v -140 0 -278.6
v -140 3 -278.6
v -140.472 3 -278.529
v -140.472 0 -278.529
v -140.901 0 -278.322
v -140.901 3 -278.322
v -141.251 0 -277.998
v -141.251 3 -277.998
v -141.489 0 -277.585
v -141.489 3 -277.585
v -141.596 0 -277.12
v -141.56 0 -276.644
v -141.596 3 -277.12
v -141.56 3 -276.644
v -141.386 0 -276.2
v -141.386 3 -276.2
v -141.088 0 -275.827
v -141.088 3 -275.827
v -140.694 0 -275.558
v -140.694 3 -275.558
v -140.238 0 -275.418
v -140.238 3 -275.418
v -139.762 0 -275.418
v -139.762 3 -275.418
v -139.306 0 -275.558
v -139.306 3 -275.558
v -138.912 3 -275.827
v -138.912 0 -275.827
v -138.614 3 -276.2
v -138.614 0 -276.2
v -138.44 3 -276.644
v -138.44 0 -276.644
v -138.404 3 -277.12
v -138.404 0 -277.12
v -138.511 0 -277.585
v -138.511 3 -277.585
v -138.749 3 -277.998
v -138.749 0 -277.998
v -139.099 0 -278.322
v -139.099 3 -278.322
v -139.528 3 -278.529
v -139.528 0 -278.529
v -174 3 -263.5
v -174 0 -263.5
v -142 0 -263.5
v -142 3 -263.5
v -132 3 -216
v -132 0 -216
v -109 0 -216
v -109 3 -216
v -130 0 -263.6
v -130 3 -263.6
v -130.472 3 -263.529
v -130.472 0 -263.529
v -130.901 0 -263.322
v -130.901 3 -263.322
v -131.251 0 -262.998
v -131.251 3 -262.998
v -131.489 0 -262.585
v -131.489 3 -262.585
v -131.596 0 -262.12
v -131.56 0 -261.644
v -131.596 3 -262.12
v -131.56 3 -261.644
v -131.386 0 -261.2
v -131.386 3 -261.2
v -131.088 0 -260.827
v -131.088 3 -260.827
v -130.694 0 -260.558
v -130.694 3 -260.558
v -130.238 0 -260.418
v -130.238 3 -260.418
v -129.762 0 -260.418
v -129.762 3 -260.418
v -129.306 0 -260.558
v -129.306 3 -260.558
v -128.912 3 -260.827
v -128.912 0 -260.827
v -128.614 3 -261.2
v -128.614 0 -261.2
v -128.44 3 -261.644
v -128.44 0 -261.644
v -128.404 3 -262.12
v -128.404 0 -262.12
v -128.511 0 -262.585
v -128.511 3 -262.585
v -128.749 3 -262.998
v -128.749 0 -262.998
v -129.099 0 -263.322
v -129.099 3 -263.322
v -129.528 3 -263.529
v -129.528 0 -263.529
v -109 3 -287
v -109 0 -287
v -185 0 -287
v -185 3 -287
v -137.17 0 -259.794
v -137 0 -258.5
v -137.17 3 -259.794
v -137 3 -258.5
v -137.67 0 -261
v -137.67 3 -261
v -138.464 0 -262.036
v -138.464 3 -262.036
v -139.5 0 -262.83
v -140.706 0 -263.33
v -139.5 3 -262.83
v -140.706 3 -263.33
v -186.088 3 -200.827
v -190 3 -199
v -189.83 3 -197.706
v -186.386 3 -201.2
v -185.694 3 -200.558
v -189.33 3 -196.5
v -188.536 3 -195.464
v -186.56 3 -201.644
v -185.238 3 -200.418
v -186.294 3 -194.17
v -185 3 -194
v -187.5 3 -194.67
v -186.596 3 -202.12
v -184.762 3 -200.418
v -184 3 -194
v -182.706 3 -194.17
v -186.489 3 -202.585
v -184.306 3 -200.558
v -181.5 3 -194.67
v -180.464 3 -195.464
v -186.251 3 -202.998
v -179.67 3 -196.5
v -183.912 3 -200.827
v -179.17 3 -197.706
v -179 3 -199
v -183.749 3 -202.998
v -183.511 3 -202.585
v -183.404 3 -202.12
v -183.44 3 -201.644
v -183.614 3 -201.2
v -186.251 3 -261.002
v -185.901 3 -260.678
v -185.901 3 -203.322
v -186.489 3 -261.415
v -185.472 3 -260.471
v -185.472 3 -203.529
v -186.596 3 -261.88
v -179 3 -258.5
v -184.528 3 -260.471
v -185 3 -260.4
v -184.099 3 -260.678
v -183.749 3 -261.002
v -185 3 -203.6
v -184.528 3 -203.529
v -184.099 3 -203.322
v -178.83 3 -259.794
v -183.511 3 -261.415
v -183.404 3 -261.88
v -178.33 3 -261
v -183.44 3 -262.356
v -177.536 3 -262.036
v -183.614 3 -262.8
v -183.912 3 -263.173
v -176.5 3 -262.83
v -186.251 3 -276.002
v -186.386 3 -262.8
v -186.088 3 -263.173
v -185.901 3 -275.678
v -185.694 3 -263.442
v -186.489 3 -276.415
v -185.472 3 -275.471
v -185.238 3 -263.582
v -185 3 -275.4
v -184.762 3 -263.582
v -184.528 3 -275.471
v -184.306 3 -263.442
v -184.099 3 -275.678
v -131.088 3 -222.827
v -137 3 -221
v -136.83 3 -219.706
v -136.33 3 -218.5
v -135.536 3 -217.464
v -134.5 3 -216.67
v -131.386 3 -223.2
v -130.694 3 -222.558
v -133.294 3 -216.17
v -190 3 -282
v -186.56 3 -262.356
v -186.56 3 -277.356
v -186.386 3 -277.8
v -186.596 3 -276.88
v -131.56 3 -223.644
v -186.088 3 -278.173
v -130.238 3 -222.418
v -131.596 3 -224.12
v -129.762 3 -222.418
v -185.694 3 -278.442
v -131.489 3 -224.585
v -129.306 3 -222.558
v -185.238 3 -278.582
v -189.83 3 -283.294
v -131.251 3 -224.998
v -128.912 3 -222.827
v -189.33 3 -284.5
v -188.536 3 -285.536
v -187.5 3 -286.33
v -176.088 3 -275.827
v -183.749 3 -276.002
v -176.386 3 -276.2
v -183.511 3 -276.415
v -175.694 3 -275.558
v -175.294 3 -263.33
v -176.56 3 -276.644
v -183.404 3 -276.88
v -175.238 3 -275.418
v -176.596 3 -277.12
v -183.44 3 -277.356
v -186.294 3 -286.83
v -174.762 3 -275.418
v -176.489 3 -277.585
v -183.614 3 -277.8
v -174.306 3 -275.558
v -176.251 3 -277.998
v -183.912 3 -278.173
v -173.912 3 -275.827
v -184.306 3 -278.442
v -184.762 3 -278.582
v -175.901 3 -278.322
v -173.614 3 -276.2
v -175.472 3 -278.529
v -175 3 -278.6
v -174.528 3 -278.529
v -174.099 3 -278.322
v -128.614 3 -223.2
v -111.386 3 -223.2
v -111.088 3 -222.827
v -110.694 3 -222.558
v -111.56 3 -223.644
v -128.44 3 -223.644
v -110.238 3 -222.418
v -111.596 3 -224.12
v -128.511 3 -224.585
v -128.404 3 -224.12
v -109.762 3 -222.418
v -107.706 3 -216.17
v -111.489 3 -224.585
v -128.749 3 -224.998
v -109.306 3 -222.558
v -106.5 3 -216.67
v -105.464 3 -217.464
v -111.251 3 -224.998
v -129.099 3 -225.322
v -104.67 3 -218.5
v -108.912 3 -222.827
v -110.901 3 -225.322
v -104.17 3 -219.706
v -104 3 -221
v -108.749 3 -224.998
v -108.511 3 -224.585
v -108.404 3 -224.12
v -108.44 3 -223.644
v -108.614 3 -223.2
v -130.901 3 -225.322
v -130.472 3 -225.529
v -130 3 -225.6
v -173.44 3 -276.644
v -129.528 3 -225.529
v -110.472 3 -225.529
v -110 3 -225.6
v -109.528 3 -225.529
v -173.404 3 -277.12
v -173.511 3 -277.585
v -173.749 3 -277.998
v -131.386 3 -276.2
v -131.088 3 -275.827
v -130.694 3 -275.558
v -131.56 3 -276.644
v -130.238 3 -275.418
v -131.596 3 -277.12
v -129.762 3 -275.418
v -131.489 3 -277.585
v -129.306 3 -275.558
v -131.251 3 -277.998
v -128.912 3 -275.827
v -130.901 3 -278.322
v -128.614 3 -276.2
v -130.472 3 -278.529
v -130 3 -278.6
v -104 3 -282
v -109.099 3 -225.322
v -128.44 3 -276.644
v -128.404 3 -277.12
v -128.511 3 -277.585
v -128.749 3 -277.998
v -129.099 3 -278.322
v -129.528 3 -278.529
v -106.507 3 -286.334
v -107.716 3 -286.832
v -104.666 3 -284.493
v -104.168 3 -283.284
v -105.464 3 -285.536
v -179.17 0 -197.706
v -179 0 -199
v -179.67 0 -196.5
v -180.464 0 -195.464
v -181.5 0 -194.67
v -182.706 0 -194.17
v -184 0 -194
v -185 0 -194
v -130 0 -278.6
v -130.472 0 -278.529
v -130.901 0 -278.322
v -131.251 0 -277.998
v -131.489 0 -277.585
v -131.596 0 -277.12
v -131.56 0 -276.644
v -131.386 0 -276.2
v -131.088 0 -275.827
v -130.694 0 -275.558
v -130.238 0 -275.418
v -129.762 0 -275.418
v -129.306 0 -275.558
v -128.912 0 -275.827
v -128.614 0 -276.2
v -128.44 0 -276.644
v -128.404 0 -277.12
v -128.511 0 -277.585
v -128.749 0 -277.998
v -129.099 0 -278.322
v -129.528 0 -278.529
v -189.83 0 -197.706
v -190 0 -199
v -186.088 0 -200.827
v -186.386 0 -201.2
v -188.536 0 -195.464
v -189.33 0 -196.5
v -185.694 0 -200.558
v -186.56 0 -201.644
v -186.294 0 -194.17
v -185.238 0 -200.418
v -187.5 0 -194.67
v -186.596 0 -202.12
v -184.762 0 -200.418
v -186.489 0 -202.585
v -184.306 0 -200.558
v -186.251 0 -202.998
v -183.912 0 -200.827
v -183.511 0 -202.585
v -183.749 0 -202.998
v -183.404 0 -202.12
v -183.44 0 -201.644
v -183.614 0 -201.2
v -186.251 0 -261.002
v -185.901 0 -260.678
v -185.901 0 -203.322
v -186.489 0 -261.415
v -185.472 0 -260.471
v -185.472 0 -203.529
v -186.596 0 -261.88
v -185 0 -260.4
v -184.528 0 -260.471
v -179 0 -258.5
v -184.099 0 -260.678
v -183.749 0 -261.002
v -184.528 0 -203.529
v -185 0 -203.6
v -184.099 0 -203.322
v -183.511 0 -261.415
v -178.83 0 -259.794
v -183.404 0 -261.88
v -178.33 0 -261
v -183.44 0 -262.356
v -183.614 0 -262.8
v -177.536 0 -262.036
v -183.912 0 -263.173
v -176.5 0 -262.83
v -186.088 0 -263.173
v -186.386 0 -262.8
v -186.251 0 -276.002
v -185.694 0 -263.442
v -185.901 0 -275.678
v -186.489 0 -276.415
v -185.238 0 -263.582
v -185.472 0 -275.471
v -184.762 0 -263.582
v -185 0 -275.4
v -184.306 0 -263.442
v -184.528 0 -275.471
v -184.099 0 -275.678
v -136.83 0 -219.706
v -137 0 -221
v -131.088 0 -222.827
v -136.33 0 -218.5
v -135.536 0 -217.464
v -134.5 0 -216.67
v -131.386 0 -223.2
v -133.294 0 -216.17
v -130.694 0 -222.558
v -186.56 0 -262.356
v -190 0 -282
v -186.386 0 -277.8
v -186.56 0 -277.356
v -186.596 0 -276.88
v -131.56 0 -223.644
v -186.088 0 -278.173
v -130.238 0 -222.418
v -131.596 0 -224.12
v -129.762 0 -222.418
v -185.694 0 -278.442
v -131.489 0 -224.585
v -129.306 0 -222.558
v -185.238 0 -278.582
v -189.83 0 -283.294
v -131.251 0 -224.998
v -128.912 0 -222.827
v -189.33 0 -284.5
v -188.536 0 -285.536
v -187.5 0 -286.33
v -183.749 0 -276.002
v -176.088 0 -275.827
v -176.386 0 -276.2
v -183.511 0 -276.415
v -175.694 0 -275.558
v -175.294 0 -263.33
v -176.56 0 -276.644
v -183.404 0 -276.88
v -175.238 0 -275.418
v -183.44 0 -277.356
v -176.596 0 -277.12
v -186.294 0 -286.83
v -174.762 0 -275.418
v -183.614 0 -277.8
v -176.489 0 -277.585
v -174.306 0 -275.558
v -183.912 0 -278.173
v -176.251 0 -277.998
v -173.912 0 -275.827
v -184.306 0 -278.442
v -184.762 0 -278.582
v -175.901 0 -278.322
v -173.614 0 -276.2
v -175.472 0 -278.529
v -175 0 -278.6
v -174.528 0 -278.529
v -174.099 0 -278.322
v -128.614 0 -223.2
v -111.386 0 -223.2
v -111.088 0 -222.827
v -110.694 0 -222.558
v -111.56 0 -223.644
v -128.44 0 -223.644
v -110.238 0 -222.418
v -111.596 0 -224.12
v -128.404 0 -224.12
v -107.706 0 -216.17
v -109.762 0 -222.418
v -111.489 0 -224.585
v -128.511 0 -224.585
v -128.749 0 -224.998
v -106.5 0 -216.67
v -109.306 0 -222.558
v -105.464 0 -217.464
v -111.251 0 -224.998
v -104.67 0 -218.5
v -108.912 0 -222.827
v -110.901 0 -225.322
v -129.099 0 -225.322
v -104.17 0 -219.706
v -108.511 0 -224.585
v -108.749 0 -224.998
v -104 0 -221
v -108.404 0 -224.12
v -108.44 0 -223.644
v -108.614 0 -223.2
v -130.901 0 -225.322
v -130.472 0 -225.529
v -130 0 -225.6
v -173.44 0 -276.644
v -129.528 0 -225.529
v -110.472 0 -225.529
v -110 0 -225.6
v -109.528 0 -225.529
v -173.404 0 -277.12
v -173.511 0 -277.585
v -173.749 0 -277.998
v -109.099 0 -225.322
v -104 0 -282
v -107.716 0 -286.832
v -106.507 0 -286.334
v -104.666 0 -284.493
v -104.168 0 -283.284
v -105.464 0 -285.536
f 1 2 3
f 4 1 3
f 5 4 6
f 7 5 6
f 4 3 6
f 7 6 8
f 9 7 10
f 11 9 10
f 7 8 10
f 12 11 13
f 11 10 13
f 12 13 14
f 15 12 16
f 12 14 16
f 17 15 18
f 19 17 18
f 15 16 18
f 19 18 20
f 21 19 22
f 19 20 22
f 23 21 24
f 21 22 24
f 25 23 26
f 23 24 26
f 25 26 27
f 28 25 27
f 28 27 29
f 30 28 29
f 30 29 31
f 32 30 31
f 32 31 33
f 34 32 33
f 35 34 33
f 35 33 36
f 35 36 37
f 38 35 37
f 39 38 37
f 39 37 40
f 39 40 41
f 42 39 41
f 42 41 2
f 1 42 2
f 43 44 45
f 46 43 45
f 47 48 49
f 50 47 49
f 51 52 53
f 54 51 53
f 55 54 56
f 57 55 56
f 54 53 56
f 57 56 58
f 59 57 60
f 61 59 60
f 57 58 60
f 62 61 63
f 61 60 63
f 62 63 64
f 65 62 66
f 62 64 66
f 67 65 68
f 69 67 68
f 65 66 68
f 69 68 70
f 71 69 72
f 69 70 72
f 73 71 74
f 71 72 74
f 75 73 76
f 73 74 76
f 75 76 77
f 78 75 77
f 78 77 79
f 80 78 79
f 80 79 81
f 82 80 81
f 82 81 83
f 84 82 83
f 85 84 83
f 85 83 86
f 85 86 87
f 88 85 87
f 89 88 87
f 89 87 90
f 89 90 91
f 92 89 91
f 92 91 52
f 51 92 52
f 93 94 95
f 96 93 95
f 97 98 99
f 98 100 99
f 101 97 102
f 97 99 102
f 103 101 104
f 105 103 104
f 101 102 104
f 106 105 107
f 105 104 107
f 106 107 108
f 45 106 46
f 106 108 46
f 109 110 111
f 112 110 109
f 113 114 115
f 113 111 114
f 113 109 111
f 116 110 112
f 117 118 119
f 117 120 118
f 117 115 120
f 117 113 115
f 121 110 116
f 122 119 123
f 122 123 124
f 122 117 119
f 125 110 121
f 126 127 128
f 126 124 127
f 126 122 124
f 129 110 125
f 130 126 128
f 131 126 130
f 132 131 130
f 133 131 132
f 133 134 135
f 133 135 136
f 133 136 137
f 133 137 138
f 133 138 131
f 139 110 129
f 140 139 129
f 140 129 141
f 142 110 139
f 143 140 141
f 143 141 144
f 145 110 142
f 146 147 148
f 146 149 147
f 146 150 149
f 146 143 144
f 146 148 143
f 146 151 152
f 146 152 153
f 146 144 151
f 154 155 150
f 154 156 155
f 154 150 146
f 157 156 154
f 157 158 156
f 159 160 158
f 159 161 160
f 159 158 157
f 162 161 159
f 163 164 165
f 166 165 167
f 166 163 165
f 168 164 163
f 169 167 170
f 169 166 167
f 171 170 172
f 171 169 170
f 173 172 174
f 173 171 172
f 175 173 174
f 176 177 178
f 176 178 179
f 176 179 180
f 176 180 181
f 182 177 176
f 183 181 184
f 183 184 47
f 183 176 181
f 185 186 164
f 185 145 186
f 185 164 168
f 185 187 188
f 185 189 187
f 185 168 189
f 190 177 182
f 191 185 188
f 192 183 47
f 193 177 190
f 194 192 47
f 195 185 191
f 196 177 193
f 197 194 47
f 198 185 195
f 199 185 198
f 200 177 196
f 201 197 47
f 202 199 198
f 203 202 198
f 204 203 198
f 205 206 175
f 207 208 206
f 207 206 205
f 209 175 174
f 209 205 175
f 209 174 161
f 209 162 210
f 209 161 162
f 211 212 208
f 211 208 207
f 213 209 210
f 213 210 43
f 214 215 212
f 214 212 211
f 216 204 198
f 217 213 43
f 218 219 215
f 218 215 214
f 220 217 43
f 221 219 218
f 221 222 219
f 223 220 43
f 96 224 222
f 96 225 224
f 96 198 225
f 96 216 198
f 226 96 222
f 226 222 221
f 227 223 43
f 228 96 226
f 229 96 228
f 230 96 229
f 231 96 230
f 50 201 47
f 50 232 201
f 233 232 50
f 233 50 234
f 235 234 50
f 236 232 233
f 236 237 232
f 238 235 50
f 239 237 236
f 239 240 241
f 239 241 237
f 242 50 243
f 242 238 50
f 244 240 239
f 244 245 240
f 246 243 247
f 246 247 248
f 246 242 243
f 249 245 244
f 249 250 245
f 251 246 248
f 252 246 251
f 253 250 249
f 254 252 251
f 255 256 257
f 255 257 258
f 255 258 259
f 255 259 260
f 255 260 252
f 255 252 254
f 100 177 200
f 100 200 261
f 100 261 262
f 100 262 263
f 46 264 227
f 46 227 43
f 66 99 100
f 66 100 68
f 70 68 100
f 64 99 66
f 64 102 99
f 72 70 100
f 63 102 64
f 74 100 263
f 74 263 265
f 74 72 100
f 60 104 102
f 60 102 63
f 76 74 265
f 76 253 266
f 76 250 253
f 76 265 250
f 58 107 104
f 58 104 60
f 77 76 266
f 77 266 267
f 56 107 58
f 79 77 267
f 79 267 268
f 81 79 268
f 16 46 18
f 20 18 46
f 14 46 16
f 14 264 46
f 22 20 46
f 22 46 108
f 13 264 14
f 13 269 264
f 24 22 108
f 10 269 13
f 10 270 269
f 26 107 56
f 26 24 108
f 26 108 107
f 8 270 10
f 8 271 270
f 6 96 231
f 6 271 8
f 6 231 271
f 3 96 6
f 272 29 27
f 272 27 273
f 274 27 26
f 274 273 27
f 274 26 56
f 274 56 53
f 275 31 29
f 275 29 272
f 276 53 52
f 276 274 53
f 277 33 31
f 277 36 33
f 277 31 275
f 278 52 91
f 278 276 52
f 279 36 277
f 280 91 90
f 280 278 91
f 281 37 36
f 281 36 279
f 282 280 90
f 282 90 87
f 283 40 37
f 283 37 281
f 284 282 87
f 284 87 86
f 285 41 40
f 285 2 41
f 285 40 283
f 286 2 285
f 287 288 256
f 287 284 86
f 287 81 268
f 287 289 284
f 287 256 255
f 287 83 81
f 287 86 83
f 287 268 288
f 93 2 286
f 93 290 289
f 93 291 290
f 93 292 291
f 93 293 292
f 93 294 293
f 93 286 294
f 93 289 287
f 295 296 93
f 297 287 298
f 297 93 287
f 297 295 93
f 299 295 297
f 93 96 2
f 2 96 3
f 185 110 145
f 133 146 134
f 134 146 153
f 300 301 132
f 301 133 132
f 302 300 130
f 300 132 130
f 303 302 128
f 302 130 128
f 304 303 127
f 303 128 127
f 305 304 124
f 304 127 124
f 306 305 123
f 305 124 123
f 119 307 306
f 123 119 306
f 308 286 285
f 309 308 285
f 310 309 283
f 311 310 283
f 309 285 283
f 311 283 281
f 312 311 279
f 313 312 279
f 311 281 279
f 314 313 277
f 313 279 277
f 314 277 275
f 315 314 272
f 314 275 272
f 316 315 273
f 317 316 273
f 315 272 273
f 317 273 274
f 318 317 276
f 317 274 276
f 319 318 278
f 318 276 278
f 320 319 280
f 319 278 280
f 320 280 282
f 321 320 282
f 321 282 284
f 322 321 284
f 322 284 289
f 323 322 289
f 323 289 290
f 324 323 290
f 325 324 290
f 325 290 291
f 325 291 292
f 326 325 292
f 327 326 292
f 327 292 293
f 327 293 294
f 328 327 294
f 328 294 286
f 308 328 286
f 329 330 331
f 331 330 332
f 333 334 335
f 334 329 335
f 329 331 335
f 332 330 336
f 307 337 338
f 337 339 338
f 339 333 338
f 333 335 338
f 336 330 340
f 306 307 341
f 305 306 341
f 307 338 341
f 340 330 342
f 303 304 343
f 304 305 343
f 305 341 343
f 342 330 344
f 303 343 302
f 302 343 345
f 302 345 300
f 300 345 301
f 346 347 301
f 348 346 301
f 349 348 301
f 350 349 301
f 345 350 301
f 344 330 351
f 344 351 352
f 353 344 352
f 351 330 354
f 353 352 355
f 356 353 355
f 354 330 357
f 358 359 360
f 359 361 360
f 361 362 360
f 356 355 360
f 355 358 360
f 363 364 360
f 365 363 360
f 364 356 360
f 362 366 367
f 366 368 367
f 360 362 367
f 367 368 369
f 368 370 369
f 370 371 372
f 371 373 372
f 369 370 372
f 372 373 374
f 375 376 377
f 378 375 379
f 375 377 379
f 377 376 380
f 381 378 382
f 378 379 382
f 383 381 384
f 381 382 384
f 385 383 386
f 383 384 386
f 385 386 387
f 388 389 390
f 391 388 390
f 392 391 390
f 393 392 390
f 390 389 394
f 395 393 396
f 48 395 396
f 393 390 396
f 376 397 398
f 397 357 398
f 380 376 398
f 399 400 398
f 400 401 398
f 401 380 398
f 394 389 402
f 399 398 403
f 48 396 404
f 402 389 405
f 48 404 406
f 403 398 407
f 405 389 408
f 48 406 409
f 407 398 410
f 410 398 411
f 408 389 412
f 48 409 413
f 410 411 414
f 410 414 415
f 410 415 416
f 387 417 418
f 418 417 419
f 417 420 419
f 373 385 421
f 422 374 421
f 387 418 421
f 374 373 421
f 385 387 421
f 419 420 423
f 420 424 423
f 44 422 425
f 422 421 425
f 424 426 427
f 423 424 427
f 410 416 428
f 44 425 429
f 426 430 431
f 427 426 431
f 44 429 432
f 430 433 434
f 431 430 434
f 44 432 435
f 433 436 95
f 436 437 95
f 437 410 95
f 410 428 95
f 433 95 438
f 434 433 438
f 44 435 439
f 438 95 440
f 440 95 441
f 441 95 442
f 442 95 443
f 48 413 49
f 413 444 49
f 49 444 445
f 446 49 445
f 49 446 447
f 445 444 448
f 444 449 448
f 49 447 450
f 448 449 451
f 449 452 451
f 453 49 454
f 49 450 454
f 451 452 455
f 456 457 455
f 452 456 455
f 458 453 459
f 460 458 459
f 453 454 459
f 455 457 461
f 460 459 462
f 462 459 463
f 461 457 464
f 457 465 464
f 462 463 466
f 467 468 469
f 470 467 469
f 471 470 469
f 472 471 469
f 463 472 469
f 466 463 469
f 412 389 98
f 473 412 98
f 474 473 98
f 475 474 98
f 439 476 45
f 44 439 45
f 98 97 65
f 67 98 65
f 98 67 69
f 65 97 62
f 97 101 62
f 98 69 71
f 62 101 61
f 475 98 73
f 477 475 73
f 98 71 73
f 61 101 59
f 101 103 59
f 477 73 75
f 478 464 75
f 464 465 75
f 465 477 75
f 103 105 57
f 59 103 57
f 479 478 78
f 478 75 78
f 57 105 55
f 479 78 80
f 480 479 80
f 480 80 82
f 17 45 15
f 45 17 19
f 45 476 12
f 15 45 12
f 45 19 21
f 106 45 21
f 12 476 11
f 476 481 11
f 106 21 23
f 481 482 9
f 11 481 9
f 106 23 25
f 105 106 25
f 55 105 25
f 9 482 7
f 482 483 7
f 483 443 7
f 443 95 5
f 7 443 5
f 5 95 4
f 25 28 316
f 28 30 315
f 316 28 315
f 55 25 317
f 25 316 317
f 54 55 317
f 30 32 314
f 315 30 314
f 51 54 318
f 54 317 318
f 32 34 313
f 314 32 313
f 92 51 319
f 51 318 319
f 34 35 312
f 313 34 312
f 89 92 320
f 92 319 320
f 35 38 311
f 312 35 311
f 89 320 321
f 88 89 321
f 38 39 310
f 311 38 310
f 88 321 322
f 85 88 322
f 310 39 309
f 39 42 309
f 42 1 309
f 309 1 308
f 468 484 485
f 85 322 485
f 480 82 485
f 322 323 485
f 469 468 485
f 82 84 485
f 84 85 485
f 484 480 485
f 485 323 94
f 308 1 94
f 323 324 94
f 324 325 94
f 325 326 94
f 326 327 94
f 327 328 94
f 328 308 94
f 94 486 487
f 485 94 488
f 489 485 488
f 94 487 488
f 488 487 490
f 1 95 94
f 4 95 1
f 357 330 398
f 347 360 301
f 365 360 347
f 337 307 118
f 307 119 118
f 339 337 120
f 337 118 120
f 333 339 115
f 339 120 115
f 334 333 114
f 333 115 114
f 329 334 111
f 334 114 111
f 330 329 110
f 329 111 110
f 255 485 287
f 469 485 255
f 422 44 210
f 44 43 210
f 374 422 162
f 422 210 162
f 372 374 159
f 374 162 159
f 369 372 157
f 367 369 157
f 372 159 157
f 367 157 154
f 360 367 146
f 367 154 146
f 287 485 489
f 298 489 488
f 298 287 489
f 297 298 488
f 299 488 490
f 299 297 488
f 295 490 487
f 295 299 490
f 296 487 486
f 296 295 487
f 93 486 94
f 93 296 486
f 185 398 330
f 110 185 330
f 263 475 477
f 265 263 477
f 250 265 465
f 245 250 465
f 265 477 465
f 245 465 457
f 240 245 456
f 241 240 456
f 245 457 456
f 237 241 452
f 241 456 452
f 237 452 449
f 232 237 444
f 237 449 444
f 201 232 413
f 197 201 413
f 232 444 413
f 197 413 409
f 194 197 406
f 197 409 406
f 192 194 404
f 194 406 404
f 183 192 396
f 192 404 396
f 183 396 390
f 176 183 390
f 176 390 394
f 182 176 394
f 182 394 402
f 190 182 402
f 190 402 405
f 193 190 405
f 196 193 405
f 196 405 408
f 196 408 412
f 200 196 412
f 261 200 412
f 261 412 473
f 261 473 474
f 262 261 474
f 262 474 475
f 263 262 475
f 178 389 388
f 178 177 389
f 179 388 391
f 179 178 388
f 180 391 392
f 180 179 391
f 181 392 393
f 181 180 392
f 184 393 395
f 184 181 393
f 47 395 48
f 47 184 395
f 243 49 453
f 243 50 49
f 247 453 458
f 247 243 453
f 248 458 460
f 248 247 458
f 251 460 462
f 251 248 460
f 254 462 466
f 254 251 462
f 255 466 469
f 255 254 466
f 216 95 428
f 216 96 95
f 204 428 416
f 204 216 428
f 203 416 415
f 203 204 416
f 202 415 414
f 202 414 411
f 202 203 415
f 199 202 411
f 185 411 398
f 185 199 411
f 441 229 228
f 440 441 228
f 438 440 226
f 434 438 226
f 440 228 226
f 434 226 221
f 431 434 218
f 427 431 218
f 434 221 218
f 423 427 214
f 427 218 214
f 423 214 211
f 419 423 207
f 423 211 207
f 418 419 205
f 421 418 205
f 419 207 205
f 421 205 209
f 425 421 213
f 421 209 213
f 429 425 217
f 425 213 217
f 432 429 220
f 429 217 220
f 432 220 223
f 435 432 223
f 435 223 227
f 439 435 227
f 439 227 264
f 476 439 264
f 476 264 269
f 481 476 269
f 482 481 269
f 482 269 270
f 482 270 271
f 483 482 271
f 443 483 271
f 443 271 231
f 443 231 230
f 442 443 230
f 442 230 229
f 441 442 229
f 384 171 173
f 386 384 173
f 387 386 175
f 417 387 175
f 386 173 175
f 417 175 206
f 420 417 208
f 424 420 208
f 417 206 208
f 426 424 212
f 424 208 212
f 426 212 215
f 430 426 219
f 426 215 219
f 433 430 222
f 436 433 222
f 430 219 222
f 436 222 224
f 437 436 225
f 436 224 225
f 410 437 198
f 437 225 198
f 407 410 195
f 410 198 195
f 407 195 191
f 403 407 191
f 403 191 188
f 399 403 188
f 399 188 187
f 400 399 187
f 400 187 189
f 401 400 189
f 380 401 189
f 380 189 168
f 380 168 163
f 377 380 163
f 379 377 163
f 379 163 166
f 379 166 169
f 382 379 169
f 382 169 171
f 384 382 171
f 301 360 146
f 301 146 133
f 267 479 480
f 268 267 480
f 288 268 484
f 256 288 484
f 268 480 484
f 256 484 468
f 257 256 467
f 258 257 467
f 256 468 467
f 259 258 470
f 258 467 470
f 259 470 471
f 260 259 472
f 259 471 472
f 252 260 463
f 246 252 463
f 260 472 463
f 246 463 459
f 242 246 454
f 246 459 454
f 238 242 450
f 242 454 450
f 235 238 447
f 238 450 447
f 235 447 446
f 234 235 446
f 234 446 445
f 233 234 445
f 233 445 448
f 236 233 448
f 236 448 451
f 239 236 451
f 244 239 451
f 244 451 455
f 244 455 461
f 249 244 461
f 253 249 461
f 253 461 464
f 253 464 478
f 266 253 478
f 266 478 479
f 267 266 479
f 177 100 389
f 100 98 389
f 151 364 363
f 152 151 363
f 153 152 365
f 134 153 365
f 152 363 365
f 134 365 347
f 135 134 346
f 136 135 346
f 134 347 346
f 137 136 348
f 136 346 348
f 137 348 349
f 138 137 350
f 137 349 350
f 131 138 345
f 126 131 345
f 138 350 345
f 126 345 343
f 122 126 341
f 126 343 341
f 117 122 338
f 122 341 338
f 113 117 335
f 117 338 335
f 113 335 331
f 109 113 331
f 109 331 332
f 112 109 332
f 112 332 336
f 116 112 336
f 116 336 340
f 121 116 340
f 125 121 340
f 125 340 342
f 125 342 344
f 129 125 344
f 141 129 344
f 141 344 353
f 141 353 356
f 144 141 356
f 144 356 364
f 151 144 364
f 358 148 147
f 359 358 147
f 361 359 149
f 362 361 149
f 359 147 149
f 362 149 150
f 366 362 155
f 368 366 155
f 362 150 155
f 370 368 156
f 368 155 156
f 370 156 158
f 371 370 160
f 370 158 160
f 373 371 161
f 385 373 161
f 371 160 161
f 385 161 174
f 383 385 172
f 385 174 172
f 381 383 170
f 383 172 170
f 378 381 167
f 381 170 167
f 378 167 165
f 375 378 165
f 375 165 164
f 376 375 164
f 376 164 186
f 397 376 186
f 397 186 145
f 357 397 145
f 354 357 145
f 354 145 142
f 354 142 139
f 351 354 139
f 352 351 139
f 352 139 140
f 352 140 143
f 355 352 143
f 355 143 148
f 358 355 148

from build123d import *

# Parameters (mm, degrees)
EXTRUDE_1048_DEPTH      = 3
SKETCH_2_R              = 37.5
SKETCH_2_R_2            = 1.6
CUT_EXTRUDE_1713_DEPTH  = 3
SKETCH_8_W              = 65
SKETCH_8_H              = 25
CUT_EXTRUDE_2585_DEPTH  = 3
SKETCH_41_W             = 55
SKETCH_41_H             = 60
CUT_EXTRUDE_2_DEPTH     = 10
SKETCH_10_W             = 65
SKETCH_10_H             = 30
CUT_EXTRUDE_3791_DEPTH  = 3
SKETCH_11_R             = 1.6
SKETCH_11_W             = 42
SKETCH_11_H             = 28
CUT_EXTRUDE_4900_DEPTH  = 3
SKETCH_13_R             = 1.6
CUT_EXTRUDE_5556_DEPTH  = 3
SKETCH_14_R             = 2
CUT_EXTRUDE_5906_DEPTH  = 3
SKETCH_15_R             = 2
CUT_EXTRUDE_6166_DEPTH  = 3
SKETCH_16_R             = 1.6
CUT_EXTRUDE_6673_DEPTH  = 3
SKETCH_19_R             = 2
SKETCH_19_R_2           = 2.5
CUT_EXTRUDE_7839_DEPTH  = 3
SKETCH_21_R             = 1.6
CUT_EXTRUDE_7991_DEPTH  = 3
CUT_EXTRUDE_9_DEPTH     = 10
SKETCH_33_R             = 1.6
PC_DEPTH                = 10
SKETCH_36_R             = 1.6
CUT_EXTRUDE_9334_DEPTH  = 345.206333469
SKETCH_29_R             = 1.6
CUT_EXTRUDE_9716_DEPTH  = 10
SKETCH_39_R             = 1.6
CUT_EXTRUDE_10318_DEPTH = 10
SKETCH_42_W             = 40
SKETCH_42_H             = 40
CUT_EXTRUDE_11_DEPTH    = 10
SKETCH_34_R             = 1.6
UWB_DEPTH               = 10
SKETCH_47_R             = 1.6
CUT_EXTRUDE_13151_DEPTH = 345.206333469
SKETCH_48_R             = 1.6
CUT_EXTRUDE_14_DEPTH    = 345.206333469
CUT_EXTRUDE_6623_DEPTH  = 10
FILLET_13946_R          = 5
FILLET_14545_R          = 2
SKETCH_53_R             = 1.6
RFID_DEPTH              = 10
SKETCH_54_R             = 1.6
CUT_EXTRUDE_19166_DEPTH = 10
SKETCH_55_OUTSIDE_W     = 518.68
SKETCH_55_OUTSIDE_H     = 706.68
CUT_EXTRUDE_17_DEPTH    = 10
FILLET_1_R              = 5
SKETCH_56_R             = 1.6
CUT_EXTRUDE_18_DEPTH    = 10
SKETCH_57_W             = 16
SKETCH_57_H             = 59
CUT_EXTRUDE_19_DEPTH    = 10
SKETCH_58_R             = 1.55
CUT_EXTRUDE_20_DEPTH    = 10
FILLET_2_R              = 2
SKETCH_59_W             = 42
SKETCH_59_H             = 69.5
CUT_EXTRUDE_21_DEPTH    = 10
SKETCH_61_W             = 31.526817686
SKETCH_61_H             = 93
CUT_EXTRUDE_23_DEPTH    = 10
SKETCH_62_W             = 33
SKETCH_62_H             = 22
CUT_EXTRUDE_24_DEPTH    = 10
FILLET_3_R              = 5
SKETCH_63_R             = 1.6
CUT_EXTRUDE_25_DEPTH    = 10


with BuildPart() as part:
    # 草图1 → Extrude 1048 (new body)
    with BuildSketch(Plane(origin=(0, 0, 0), x_dir=(1, 0, 0), z_dir=(0, 1, 0))):
        Polygon((190, 287), (101.545, 287), (79.605689771, 249), (-79.605689771, 249), (-101.545, 287), (-190, 287), (-190, 0), (-190, -281), (-144.091695942, -281), (-98.660254038, -281), (-74.411542732, -239), (74.411542732, -239), (98.660254038, -281), (144.091695942, -281), (190, -281), (190, 0), align=None)
    extrude(amount=EXTRUDE_1048_DEPTH)

    # 草图2 → Cut-Extrude 1713 (cut)
    with BuildSketch(Plane(origin=(0, 3, 0), x_dir=(1, 0, 0), z_dir=(0, 1, 0))):
        Circle(SKETCH_2_R)
        with Locations((38.97114317, 22.5)):
            Circle(SKETCH_2_R_2)
        with Locations((0, -45)):
            Circle(SKETCH_2_R_2)
        with Locations((-38.97114317, 22.5)):
            Circle(SKETCH_2_R_2)
    extrude(amount=-CUT_EXTRUDE_1713_DEPTH, mode=Mode.SUBTRACT)

    # 草图8 → Cut-Extrude 2585 (cut)
    with BuildSketch(Plane(origin=(0, 3, 0), x_dir=(1, 0, 0), z_dir=(0, 1, 0))):
        with Locations((115, -161.5)):
            Rectangle(SKETCH_8_W, SKETCH_8_H)
        with Locations((-115, -161.5)):
            Rectangle(SKETCH_8_W, SKETCH_8_H)
    extrude(amount=-CUT_EXTRUDE_2585_DEPTH, mode=Mode.SUBTRACT)

    # 草图41 → 减重过线孔2 (cut)
    with BuildSketch(Plane(origin=(0, 3, 0), x_dir=(1, 0, 0), z_dir=(0, 1, 0))):
        with Locations((-102.5, 70)):
            Rectangle(SKETCH_41_W, SKETCH_41_H)
        with Locations((102.5, 70)):
            Rectangle(SKETCH_41_W, SKETCH_41_H)
        with Locations((102.5, -70)):
            Rectangle(SKETCH_41_W, SKETCH_41_H)
        with Locations((-102.5, -70)):
            Rectangle(SKETCH_41_W, SKETCH_41_H)
    extrude(amount=-CUT_EXTRUDE_2_DEPTH, mode=Mode.SUBTRACT)

    # 草图10 → Cut-Extrude 3791 (cut)
    with BuildSketch(Plane(origin=(0, 3, 0), x_dir=(1, 0, 0), z_dir=(0, 1, 0))):
        with Locations((-130, 167)):
            Rectangle(SKETCH_10_W, SKETCH_10_H)
        with Locations((130, 167)):
            Rectangle(SKETCH_10_W, SKETCH_10_H)
    extrude(amount=-CUT_EXTRUDE_3791_DEPTH, mode=Mode.SUBTRACT)

    # 草图11 → Cut-Extrude 4900 (cut)
    with BuildSketch(Plane(origin=(0, 3, 0), x_dir=(1, 0, 0), z_dir=(0, 1, 0))):
        with Locations((-153.5, 259)):
            Circle(SKETCH_11_R)
        with Locations((-162.5, 259)):
            Circle(SKETCH_11_R)
        with Locations((-153.5, 209)):
            Circle(SKETCH_11_R)
        with Locations((-162.5, 209)):
            Circle(SKETCH_11_R)
        with Locations((153.5, 259)):
            Circle(SKETCH_11_R)
        with Locations((162.5, 259)):
            Circle(SKETCH_11_R)
        with Locations((153.5, 209)):
            Circle(SKETCH_11_R)
        with Locations((162.5, 209)):
            Circle(SKETCH_11_R)
        with Locations((162.5, -209)):
            Circle(SKETCH_11_R)
        with Locations((153.5, -209)):
            Circle(SKETCH_11_R)
        with Locations((162.5, -259)):
            Circle(SKETCH_11_R)
        with Locations((153.5, -259)):
            Circle(SKETCH_11_R)
        with Locations((-162.5, -209)):
            Circle(SKETCH_11_R)
        with Locations((-153.5, -209)):
            Circle(SKETCH_11_R)
        with Locations((-153.5, -259)):
            Circle(SKETCH_11_R)
        with Locations((-162.5, -259)):
            Circle(SKETCH_11_R)
        with Locations((-158, 234)):
            Rectangle(SKETCH_11_W, SKETCH_11_H)
        with Locations((158, 234)):
            Rectangle(SKETCH_11_W, SKETCH_11_H)
        with Locations((158, -234)):
            Rectangle(SKETCH_11_W, SKETCH_11_H)
        with Locations((-158, -234)):
            Rectangle(SKETCH_11_W, SKETCH_11_H)
    extrude(amount=-CUT_EXTRUDE_4900_DEPTH, mode=Mode.SUBTRACT)

    # 草图13 → Cut-Extrude 5556 (cut)
    with BuildSketch(Plane(origin=(0, 3, 0), x_dir=(1, 0, 0), z_dir=(0, 1, 0))):
        with Locations((25, 176)):
            Circle(SKETCH_13_R)
        with Locations((25, 226)):
            Circle(SKETCH_13_R)
        with Locations((-25, 226)):
            Circle(SKETCH_13_R)
        with Locations((-25, 176)):
            Circle(SKETCH_13_R)
    extrude(amount=-CUT_EXTRUDE_5556_DEPTH, mode=Mode.SUBTRACT)

    # 草图14 → Cut-Extrude 5906 (cut)
    with BuildSketch(Plane(origin=(0, 3, 0), x_dir=(1, 0, 0), z_dir=(0, 1, 0))):
        with Locations((-47.5, 239)):
            Circle(SKETCH_14_R)
        with Locations((-47.5, 214)):
            Circle(SKETCH_14_R)
        with Locations((47.5, 214)):
            Circle(SKETCH_14_R)
        with Locations((47.5, 239)):
            Circle(SKETCH_14_R)
        with Locations((-47.5, -207)):
            Circle(SKETCH_14_R)
        with Locations((-47.5, -232)):
            Circle(SKETCH_14_R)
        with Locations((47.5, -232)):
            Circle(SKETCH_14_R)
        with Locations((47.5, -207)):
            Circle(SKETCH_14_R)
    extrude(amount=-CUT_EXTRUDE_5906_DEPTH, mode=Mode.SUBTRACT)

    # 草图15 → Cut-Extrude 6166 (cut)
    with BuildSketch(Plane(origin=(0, 3, 0), x_dir=(1, 0, 0), z_dir=(0, 1, 0))):
        with Locations((155, 47.5)):
            Circle(SKETCH_15_R)
        with Locations((180, 47.5)):
            Circle(SKETCH_15_R)
        with Locations((180, -47.5)):
            Circle(SKETCH_15_R)
        with Locations((155, -47.5)):
            Circle(SKETCH_15_R)
        with Locations((-155, -47.5)):
            Circle(SKETCH_15_R)
        with Locations((-180, -47.5)):
            Circle(SKETCH_15_R)
        with Locations((-180, 47.5)):
            Circle(SKETCH_15_R)
        with Locations((-155, 47.5)):
            Circle(SKETCH_15_R)
    extrude(amount=-CUT_EXTRUDE_6166_DEPTH, mode=Mode.SUBTRACT)

    # 草图16 → Cut-Extrude 6673 (cut)
    with BuildSketch(Plane(origin=(0, 3, 0), x_dir=(1, 0, 0), z_dir=(0, 1, 0))):
        with Locations((-64, 229)):
            Circle(SKETCH_16_R)
        with Locations((-64, 117)):
            Circle(SKETCH_16_R)
        with Locations((-64, 5)):
            Circle(SKETCH_16_R)
        with Locations((-64, -107)):
            Circle(SKETCH_16_R)
        with Locations((-64, -219)):
            Circle(SKETCH_16_R)
        with Locations((64, 229)):
            Circle(SKETCH_16_R)
        with Locations((64, -107)):
            Circle(SKETCH_16_R)
        with Locations((64, 5)):
            Circle(SKETCH_16_R)
        with Locations((64, 117)):
            Circle(SKETCH_16_R)
        with Locations((64, -219)):
            Circle(SKETCH_16_R)
    extrude(amount=-CUT_EXTRUDE_6673_DEPTH, mode=Mode.SUBTRACT)

    # 草图19 → Cut-Extrude 7839 (cut)
    with BuildSketch(Plane(origin=(0, 3, 0), x_dir=(1, 0, 0), z_dir=(0, 1, 0))):
        with Locations((-177.5, -78)):
            Circle(SKETCH_19_R)
        with Locations((-177.5, -94)):
            Circle(SKETCH_19_R_2)
        with Locations((-177.5, 94)):
            Circle(SKETCH_19_R_2)
        with Locations((-177.5, 78)):
            Circle(SKETCH_19_R)
        with Locations((177.5, -94)):
            Circle(SKETCH_19_R_2)
        with Locations((177.5, -78)):
            Circle(SKETCH_19_R)
        with Locations((177.5, 78)):
            Circle(SKETCH_19_R)
        with Locations((177.5, 94)):
            Circle(SKETCH_19_R_2)
    extrude(amount=-CUT_EXTRUDE_7839_DEPTH, mode=Mode.SUBTRACT)

    # 草图21 → Cut-Extrude 7991 (cut)
    with BuildSketch(Plane(origin=(0, 3, 0), x_dir=(1, 0, 0), z_dir=(0, 1, 0))):
        with Locations((0, -93)):
            Circle(SKETCH_21_R)
    extrude(amount=-CUT_EXTRUDE_7991_DEPTH, mode=Mode.SUBTRACT)

    # 草图32 → 切除-拉伸9 (cut)
    with BuildSketch(Plane(origin=(0, 3, 0), x_dir=(1, 0, 0), z_dir=(0, 1, 0))):
        with BuildLine():
            Line((-34.5, -190), (34.5, -190))
            ThreePointArc((34.5, -190), (36.621320344, -189.121320344), (37.5, -187))
            Line((37.5, -187), (37.5, -133))
            ThreePointArc((37.5, -133), (36.621320344, -130.878679656), (34.5, -130))
            Line((34.5, -130), (-34.5, -130))
            ThreePointArc((-34.5, -130), (-36.621320344, -130.878679656), (-37.5, -133))
            Line((-37.5, -133), (-37.5, -187))
            ThreePointArc((-37.5, -187), (-36.621320344, -189.121320344), (-34.5, -190))
        make_face()
    extrude(amount=-CUT_EXTRUDE_9_DEPTH, mode=Mode.SUBTRACT)

    # 草图33 → PC座固定孔 (cut)
    with BuildSketch(Plane(origin=(0, 3, 0), x_dir=(1, 0, 0), z_dir=(0, 1, 0))):
        with Locations((-42.5, -120.5)):
            Circle(SKETCH_33_R)
        with Locations((42.5, -120.5)):
            Circle(SKETCH_33_R)
    extrude(amount=-PC_DEPTH, mode=Mode.SUBTRACT)

    # 草图36 → Cut-Extrude 9334 (cut, through all)
    with BuildSketch(Plane(origin=(0, 3, 0), x_dir=(1, 0, 0), z_dir=(0, 1, 0))):
        with Locations((-80, -231)):
            Circle(SKETCH_36_R)
        with Locations((-80, -219)):
            Circle(SKETCH_36_R)
        with Locations((80, -219)):
            Circle(SKETCH_36_R)
        with Locations((80, -231)):
            Circle(SKETCH_36_R)
        with Locations((-80, 241)):
            Circle(SKETCH_36_R)
        with Locations((-80, 229)):
            Circle(SKETCH_36_R)
        with Locations((80, 229)):
            Circle(SKETCH_36_R)
        with Locations((80, 241)):
            Circle(SKETCH_36_R)
    extrude(amount=-CUT_EXTRUDE_9334_DEPTH, mode=Mode.SUBTRACT)

    # 草图29 → Cut-Extrude 9716 (cut)
    with BuildSketch(Plane(origin=(0, 3, 0), x_dir=(1, 0, 0), z_dir=(0, 1, 0))):
        with Locations((48, 120)):
            Circle(SKETCH_29_R)
        with Locations((0, 86)):
            Circle(SKETCH_29_R)
        with Locations((0, 154)):
            Circle(SKETCH_29_R)
        with Locations((-48, 120)):
            Circle(SKETCH_29_R)
        with BuildLine():
            Line((40, 98), (40, 142))
            ThreePointArc((40, 142), (39.121320344, 144.121320344), (37, 145))
            Line((37, 145), (-37, 145))
            ThreePointArc((-37, 145), (-39.121320344, 144.121320344), (-40, 142))
            Line((-40, 142), (-40, 98))
            ThreePointArc((-40, 98), (-39.121320344, 95.878679656), (-37, 95))
            Line((-37, 95), (37, 95))
            ThreePointArc((37, 95), (39.121320344, 95.878679656), (40, 98))
        make_face()
    extrude(amount=-CUT_EXTRUDE_9716_DEPTH, mode=Mode.SUBTRACT)

    # 草图39 → Cut-Extrude 10318 (cut)
    with BuildSketch(Plane(origin=(0, 3, 0), x_dir=(1, 0, 0), z_dir=(0, 1, 0))):
        with Locations((185, -271)):
            Circle(SKETCH_39_R)
        with Locations((185, -256)):
            Circle(SKETCH_39_R)
        with Locations((130, -256)):
            Circle(SKETCH_39_R)
        with Locations((130, -271)):
            Circle(SKETCH_39_R)
        with Locations((-130, -271)):
            Circle(SKETCH_39_R)
        with Locations((-130, -256)):
            Circle(SKETCH_39_R)
        with Locations((-185, -256)):
            Circle(SKETCH_39_R)
        with Locations((-185, -271)):
            Circle(SKETCH_39_R)
        with Locations((-130, 262)):
            Circle(SKETCH_39_R)
        with Locations((-130, 277)):
            Circle(SKETCH_39_R)
        with Locations((185, 262)):
            Circle(SKETCH_39_R)
        with Locations((185, 277)):
            Circle(SKETCH_39_R)
        with Locations((-185, 277)):
            Circle(SKETCH_39_R)
        with Locations((-185, 262)):
            Circle(SKETCH_39_R)
        with Locations((130, 277)):
            Circle(SKETCH_39_R)
        with Locations((130, 262)):
            Circle(SKETCH_39_R)
    extrude(amount=-CUT_EXTRUDE_10318_DEPTH, mode=Mode.SUBTRACT)

    # 草图42 → 切除-拉伸11 (cut)
    with BuildSketch(Plane(origin=(0, 3, 0), x_dir=(1, 0, 0), z_dir=(0, 1, 0))):
        with Locations((0, 201)):
            Rectangle(SKETCH_42_W, SKETCH_42_H)
    extrude(amount=-CUT_EXTRUDE_11_DEPTH, mode=Mode.SUBTRACT)

    # 草图34 → UWB固定孔 (cut)
    with BuildSketch(Plane(origin=(0, 3, 0), x_dir=(1, 0, 0), z_dir=(0, 1, 0))):
        with Locations((90, 168)):
            Circle(SKETCH_34_R)
        with Locations((71, 187)):
            Circle(SKETCH_34_R)
        with Locations((90, 206)):
            Circle(SKETCH_34_R)
        with Locations((109, 187)):
            Circle(SKETCH_34_R)
    extrude(amount=-UWB_DEPTH, mode=Mode.SUBTRACT)

    # 草图47 → Cut-Extrude 13151 (cut, through all)
    with BuildSketch(Plane(origin=(0, 3, 0), x_dir=(1, 0, 0), z_dir=(0, 1, 0))):
        with Locations((140, 277)):
            Circle(SKETCH_47_R)
        with Locations((185, -271)):
            Circle(SKETCH_47_R)
        with Locations((95, -231)):
            Circle(SKETCH_47_R)
        with Locations((175, -271)):
            Circle(SKETCH_47_R)
        with Locations((140, 213)):
            Circle(SKETCH_47_R)
        with Locations((175, -207)):
            Circle(SKETCH_47_R)
        with Locations((-140, -271)):
            Circle(SKETCH_47_R)
        with Locations((-140, -207)):
            Circle(SKETCH_47_R)
        with Locations((-175, 213)):
            Circle(SKETCH_47_R)
        with Locations((-95, 237)):
            Circle(SKETCH_47_R)
        with Locations((185, 277)):
            Circle(SKETCH_47_R)
        with Locations((175, 277)):
            Circle(SKETCH_47_R)
        with Locations((95, 237)):
            Circle(SKETCH_47_R)
        with Locations((175, 213)):
            Circle(SKETCH_47_R)
        with Locations((-175, 277)):
            Circle(SKETCH_47_R)
        with Locations((-185, 277)):
            Circle(SKETCH_47_R)
        with Locations((140, -207)):
            Circle(SKETCH_47_R)
        with Locations((140, -271)):
            Circle(SKETCH_47_R)
        with Locations((-175, -207)):
            Circle(SKETCH_47_R)
        with Locations((-140, 213)):
            Circle(SKETCH_47_R)
        with Locations((-175, -271)):
            Circle(SKETCH_47_R)
        with Locations((-95, -231)):
            Circle(SKETCH_47_R)
        with Locations((-185, -271)):
            Circle(SKETCH_47_R)
        with Locations((-140, 277)):
            Circle(SKETCH_47_R)
    extrude(amount=-CUT_EXTRUDE_13151_DEPTH, mode=Mode.SUBTRACT)

    # 草图48 → 切除-拉伸14 (cut, through all)
    with BuildSketch(Plane(origin=(0, 3, 0), x_dir=(1, 0, 0), z_dir=(0, 1, 0))):
        with Locations((-44.5, -46)):
            Circle(SKETCH_48_R)
        with Locations((44.5, -46)):
            Circle(SKETCH_48_R)
        with Locations((-9, -196)):
            Circle(SKETCH_48_R)
        with Locations((9, -196)):
            Circle(SKETCH_48_R)
    extrude(amount=-CUT_EXTRUDE_14_DEPTH, mode=Mode.SUBTRACT)

    # 草图51 → 6623电机过线孔 (cut)
    with BuildSketch(Plane(origin=(0, 3, 0), x_dir=(1, 0, 0), z_dir=(0, 1, 0))):
        with BuildLine():
            Line((-20.5, 67.5), (20.5, 67.5))
            ThreePointArc((20.5, 67.5), (21.914213562, 66.914213562), (22.5, 65.5))
            Line((22.5, 65.5), (22.5, 54.5))
            ThreePointArc((22.5, 54.5), (21.914213562, 53.085786438), (20.5, 52.5))
            Line((20.5, 52.5), (-20.5, 52.5))
            ThreePointArc((-20.5, 52.5), (-21.914213562, 53.085786438), (-22.5, 54.5))
            Line((-22.5, 54.5), (-22.5, 65.5))
            ThreePointArc((-22.5, 65.5), (-21.914213562, 66.914213562), (-20.5, 67.5))
        make_face()
    extrude(amount=-CUT_EXTRUDE_6623_DEPTH, mode=Mode.SUBTRACT)

    # Fillet 13946
    fillet_13946_edges = [part.edges().sort_by_distance(p)[0] for p in [
        (-190, 1.5, -287),
        (-101.545, 1.5, -287),
        (-79.605689771, 1.5, -249),
        (79.605689771, 1.5, -249),
        (101.545, 1.5, -287),
        (190, 1.5, -287),
        (190, 1.5, 281),
        (98.660254038, 1.5, 281),
        (74.411542732, 1.5, 239),
        (-74.411542732, 1.5, 239),
        (-98.660254038, 1.5, 281),
        (-190, 1.5, 281),
    ]]
    fillet(fillet_13946_edges, radius=FILLET_13946_R)

    # Fillet 14545
    fillet_14545_edges = [part.edges().sort_by_distance(p)[0] for p in [
        (-147.5, 1.5, 149),
        (-82.5, 1.5, 149),
        (-82.5, 1.5, 174),
        (-147.5, 1.5, 174),
        (82.5, 1.5, 149),
        (147.5, 1.5, 149),
        (147.5, 1.5, 174),
        (82.5, 1.5, 174),
        (-130, 1.5, -100),
        (-75, 1.5, -100),
        (-75, 1.5, -40),
        (-130, 1.5, -40),
        (-130, 1.5, 100),
        (-130, 1.5, 40),
        (-75, 1.5, 40),
        (-75, 1.5, 100),
        (130, 1.5, 100),
        (75, 1.5, 100),
        (75, 1.5, 40),
        (130, 1.5, 40),
        (130, 1.5, -100),
        (130, 1.5, -40),
        (75, 1.5, -40),
        (75, 1.5, -100),
        (-97.5, 1.5, -152),
        (-162.5, 1.5, -152),
        (-162.5, 1.5, -182),
        (-97.5, 1.5, -182),
        (162.5, 1.5, -182),
        (-137, 1.5, -220),
        (-179, 1.5, -220),
        (-179, 1.5, -248),
        (-137, 1.5, -248),
        (-179, 1.5, 220),
        (-137, 1.5, 220),
        (-137, 1.5, 248),
        (179, 1.5, 248),
        (137, 1.5, 248),
        (137, 1.5, 220),
        (179, 1.5, 220),
        (179, 1.5, -248),
        (179, 1.5, -220),
        (137, 1.5, -220),
        (137, 1.5, -248),
        (20, 1.5, -181),
        (-20, 1.5, -181),
        (-20, 1.5, -221),
        (20, 1.5, -221),
        (-179, 1.5, 248),
        (162.5, 1.5, -152),
        (97.5, 1.5, -152),
        (97.5, 1.5, -182),
    ]]
    fillet(fillet_14545_edges, radius=FILLET_14545_R)

    # 草图53 → RFID固定孔 (cut)
    with BuildSketch(Plane(origin=(0, 3, 0), x_dir=(1, 0, 0), z_dir=(0, 1, 0))):
        with Locations((-135, -31)):
            Circle(SKETCH_53_R)
        with Locations((-85, -31)):
            Circle(SKETCH_53_R)
        with Locations((-85, 31)):
            Circle(SKETCH_53_R)
        with Locations((-135, 31)):
            Circle(SKETCH_53_R)
        with Locations((135, 31)):
            Circle(SKETCH_53_R)
        with Locations((85, 31)):
            Circle(SKETCH_53_R)
        with Locations((85, -31)):
            Circle(SKETCH_53_R)
        with Locations((135, -31)):
            Circle(SKETCH_53_R)
    extrude(amount=-RFID_DEPTH, mode=Mode.SUBTRACT)

    # 草图54 → Cut-Extrude 19166 (cut)
    with BuildSketch(Plane.XZ):
        with Locations((-102.122350269, -278)):
            Circle(SKETCH_54_R)
        with Locations((-92.122350269, -260.679491924)):
            Circle(SKETCH_54_R)
        with Locations((92.122350269, -260.679491924)):
            Circle(SKETCH_54_R)
        with Locations((102.122350269, -278)):
            Circle(SKETCH_54_R)
        with Locations((102.122350269, 272)):
            Circle(SKETCH_54_R)
        with Locations((92.122350269, 254.679491924)):
            Circle(SKETCH_54_R)
        with Locations((-92.122350269, 254.679491924)):
            Circle(SKETCH_54_R)
        with Locations((-102.122350269, 272)):
            Circle(SKETCH_54_R)
    extrude(amount=-CUT_EXTRUDE_19166_DEPTH, mode=Mode.SUBTRACT)

    # 草图55 outside → 切除-拉伸17 (cut)
    with BuildSketch(Plane.XZ):
        with Locations((0, -3)):
            Rectangle(SKETCH_55_OUTSIDE_W, SKETCH_55_OUTSIDE_H)
        with BuildLine():
            Line((-190, -194), (-125, -194))
            Line((-125, -194), (-87, -230))
            Line((-87, -230), (-87, -261.807321004))
            Line((-87, -261.807321004), (-100.101624327, -284.5))
            ThreePointArc((-100.101624327, -284.5), (-101.931751346, -286.330127019), (-104.431751346, -287))
            Line((-104.431751346, -287), (-185, -287))
            ThreePointArc((-185, -287), (-188.535533906, -285.535533906), (-190, -282))
            Line((-190, -282), (-190, -194))
        make_face(mode=Mode.SUBTRACT)
    extrude(amount=-CUT_EXTRUDE_17_DEPTH, mode=Mode.SUBTRACT)

    # 圆角1
    fillet_1_edges = [part.edges().sort_by_distance(p)[0] for p in [
        (-190, 1.5, -194),
        (-87, 1.5, -261.807321004),
        (-87, 1.5, -230),
        (-125, 1.5, -194),
    ]]
    fillet(fillet_1_edges, radius=FILLET_1_R)

    # 草图56 → 切除-拉伸18 (cut)
    with BuildSketch(Plane.XZ):
        with Locations((-185, -202)):
            Circle(SKETCH_56_R)
        with Locations((-131, -202)):
            Circle(SKETCH_56_R)
    extrude(amount=-CUT_EXTRUDE_18_DEPTH, mode=Mode.SUBTRACT)

    # 草图57 → 切除-拉伸19 (cut)
    with BuildSketch(Plane.XZ):
        with Locations((-158, -234)):
            Rectangle(SKETCH_57_W, SKETCH_57_H)
    extrude(amount=-CUT_EXTRUDE_19_DEPTH, mode=Mode.SUBTRACT)

    # 草图58 → 切除-拉伸20 (cut)
    with BuildSketch(Plane.XZ):
        with Locations((-150, -261.95)):
            Circle(SKETCH_58_R)
        with Locations((-166, -261.95)):
            Circle(SKETCH_58_R)
        with Locations((-166, -206.05)):
            Circle(SKETCH_58_R)
        with Locations((-150, -206.05)):
            Circle(SKETCH_58_R)
    extrude(amount=-CUT_EXTRUDE_20_DEPTH, mode=Mode.SUBTRACT)

    # 圆角2
    fillet_2_edges = [part.edges().sort_by_distance(p)[0] for p in [
        (-150, 1.5, -248),
        (-166, 1.5, -248),
        (-150, 1.5, -220),
        (-166, 1.5, -220),
    ]]
    fillet(fillet_2_edges, radius=FILLET_2_R)

    # 草图59 → 切除-拉伸21 (cut)
    with BuildSketch(Plane.XZ):
        with Locations((-158, -228.75)):
            Rectangle(SKETCH_59_W, SKETCH_59_H)
    extrude(amount=-CUT_EXTRUDE_21_DEPTH, mode=Mode.SUBTRACT)

    # 草图61 → 切除-拉伸23 (cut)
    with BuildSketch(Plane.XZ):
        with Locations((-88.236591157, -240.5)):
            Rectangle(SKETCH_61_W, SKETCH_61_H)
    extrude(amount=-CUT_EXTRUDE_23_DEPTH, mode=Mode.SUBTRACT)

    # 草图62 → 切除-拉伸24 (cut)
    with BuildSketch(Plane.XZ):
        with Locations((-120.5, -205)):
            Rectangle(SKETCH_62_W, SKETCH_62_H)
    extrude(amount=-CUT_EXTRUDE_24_DEPTH, mode=Mode.SUBTRACT)

    # 圆角3
    fillet_3_edges = [part.edges().sort_by_distance(p)[0] for p in [
        (-137, 1.5, -263.5),
        (-179, 1.5, -263.5),
    ]]
    fillet(fillet_3_edges, radius=FILLET_3_R)
    fillet_3_2_edges = [part.edges().sort_by_distance(p)[0] for p in [
        (-104, 1.5, -286.981324199),
        (-104, 1.5, -216),
        (-137, 1.5, -216),
        (-179, 1.5, -194),
    ]]
    fillet(fillet_3_2_edges, radius=FILLET_3_R)

    # 草图63 → 切除-拉伸25 (cut)
    with BuildSketch(Plane.XZ):
        with Locations((-130, -224)):
            Circle(SKETCH_63_R)
        with Locations((-110, -224)):
            Circle(SKETCH_63_R)
    extrude(amount=-CUT_EXTRUDE_25_DEPTH, mode=Mode.SUBTRACT)


solid = part.part
